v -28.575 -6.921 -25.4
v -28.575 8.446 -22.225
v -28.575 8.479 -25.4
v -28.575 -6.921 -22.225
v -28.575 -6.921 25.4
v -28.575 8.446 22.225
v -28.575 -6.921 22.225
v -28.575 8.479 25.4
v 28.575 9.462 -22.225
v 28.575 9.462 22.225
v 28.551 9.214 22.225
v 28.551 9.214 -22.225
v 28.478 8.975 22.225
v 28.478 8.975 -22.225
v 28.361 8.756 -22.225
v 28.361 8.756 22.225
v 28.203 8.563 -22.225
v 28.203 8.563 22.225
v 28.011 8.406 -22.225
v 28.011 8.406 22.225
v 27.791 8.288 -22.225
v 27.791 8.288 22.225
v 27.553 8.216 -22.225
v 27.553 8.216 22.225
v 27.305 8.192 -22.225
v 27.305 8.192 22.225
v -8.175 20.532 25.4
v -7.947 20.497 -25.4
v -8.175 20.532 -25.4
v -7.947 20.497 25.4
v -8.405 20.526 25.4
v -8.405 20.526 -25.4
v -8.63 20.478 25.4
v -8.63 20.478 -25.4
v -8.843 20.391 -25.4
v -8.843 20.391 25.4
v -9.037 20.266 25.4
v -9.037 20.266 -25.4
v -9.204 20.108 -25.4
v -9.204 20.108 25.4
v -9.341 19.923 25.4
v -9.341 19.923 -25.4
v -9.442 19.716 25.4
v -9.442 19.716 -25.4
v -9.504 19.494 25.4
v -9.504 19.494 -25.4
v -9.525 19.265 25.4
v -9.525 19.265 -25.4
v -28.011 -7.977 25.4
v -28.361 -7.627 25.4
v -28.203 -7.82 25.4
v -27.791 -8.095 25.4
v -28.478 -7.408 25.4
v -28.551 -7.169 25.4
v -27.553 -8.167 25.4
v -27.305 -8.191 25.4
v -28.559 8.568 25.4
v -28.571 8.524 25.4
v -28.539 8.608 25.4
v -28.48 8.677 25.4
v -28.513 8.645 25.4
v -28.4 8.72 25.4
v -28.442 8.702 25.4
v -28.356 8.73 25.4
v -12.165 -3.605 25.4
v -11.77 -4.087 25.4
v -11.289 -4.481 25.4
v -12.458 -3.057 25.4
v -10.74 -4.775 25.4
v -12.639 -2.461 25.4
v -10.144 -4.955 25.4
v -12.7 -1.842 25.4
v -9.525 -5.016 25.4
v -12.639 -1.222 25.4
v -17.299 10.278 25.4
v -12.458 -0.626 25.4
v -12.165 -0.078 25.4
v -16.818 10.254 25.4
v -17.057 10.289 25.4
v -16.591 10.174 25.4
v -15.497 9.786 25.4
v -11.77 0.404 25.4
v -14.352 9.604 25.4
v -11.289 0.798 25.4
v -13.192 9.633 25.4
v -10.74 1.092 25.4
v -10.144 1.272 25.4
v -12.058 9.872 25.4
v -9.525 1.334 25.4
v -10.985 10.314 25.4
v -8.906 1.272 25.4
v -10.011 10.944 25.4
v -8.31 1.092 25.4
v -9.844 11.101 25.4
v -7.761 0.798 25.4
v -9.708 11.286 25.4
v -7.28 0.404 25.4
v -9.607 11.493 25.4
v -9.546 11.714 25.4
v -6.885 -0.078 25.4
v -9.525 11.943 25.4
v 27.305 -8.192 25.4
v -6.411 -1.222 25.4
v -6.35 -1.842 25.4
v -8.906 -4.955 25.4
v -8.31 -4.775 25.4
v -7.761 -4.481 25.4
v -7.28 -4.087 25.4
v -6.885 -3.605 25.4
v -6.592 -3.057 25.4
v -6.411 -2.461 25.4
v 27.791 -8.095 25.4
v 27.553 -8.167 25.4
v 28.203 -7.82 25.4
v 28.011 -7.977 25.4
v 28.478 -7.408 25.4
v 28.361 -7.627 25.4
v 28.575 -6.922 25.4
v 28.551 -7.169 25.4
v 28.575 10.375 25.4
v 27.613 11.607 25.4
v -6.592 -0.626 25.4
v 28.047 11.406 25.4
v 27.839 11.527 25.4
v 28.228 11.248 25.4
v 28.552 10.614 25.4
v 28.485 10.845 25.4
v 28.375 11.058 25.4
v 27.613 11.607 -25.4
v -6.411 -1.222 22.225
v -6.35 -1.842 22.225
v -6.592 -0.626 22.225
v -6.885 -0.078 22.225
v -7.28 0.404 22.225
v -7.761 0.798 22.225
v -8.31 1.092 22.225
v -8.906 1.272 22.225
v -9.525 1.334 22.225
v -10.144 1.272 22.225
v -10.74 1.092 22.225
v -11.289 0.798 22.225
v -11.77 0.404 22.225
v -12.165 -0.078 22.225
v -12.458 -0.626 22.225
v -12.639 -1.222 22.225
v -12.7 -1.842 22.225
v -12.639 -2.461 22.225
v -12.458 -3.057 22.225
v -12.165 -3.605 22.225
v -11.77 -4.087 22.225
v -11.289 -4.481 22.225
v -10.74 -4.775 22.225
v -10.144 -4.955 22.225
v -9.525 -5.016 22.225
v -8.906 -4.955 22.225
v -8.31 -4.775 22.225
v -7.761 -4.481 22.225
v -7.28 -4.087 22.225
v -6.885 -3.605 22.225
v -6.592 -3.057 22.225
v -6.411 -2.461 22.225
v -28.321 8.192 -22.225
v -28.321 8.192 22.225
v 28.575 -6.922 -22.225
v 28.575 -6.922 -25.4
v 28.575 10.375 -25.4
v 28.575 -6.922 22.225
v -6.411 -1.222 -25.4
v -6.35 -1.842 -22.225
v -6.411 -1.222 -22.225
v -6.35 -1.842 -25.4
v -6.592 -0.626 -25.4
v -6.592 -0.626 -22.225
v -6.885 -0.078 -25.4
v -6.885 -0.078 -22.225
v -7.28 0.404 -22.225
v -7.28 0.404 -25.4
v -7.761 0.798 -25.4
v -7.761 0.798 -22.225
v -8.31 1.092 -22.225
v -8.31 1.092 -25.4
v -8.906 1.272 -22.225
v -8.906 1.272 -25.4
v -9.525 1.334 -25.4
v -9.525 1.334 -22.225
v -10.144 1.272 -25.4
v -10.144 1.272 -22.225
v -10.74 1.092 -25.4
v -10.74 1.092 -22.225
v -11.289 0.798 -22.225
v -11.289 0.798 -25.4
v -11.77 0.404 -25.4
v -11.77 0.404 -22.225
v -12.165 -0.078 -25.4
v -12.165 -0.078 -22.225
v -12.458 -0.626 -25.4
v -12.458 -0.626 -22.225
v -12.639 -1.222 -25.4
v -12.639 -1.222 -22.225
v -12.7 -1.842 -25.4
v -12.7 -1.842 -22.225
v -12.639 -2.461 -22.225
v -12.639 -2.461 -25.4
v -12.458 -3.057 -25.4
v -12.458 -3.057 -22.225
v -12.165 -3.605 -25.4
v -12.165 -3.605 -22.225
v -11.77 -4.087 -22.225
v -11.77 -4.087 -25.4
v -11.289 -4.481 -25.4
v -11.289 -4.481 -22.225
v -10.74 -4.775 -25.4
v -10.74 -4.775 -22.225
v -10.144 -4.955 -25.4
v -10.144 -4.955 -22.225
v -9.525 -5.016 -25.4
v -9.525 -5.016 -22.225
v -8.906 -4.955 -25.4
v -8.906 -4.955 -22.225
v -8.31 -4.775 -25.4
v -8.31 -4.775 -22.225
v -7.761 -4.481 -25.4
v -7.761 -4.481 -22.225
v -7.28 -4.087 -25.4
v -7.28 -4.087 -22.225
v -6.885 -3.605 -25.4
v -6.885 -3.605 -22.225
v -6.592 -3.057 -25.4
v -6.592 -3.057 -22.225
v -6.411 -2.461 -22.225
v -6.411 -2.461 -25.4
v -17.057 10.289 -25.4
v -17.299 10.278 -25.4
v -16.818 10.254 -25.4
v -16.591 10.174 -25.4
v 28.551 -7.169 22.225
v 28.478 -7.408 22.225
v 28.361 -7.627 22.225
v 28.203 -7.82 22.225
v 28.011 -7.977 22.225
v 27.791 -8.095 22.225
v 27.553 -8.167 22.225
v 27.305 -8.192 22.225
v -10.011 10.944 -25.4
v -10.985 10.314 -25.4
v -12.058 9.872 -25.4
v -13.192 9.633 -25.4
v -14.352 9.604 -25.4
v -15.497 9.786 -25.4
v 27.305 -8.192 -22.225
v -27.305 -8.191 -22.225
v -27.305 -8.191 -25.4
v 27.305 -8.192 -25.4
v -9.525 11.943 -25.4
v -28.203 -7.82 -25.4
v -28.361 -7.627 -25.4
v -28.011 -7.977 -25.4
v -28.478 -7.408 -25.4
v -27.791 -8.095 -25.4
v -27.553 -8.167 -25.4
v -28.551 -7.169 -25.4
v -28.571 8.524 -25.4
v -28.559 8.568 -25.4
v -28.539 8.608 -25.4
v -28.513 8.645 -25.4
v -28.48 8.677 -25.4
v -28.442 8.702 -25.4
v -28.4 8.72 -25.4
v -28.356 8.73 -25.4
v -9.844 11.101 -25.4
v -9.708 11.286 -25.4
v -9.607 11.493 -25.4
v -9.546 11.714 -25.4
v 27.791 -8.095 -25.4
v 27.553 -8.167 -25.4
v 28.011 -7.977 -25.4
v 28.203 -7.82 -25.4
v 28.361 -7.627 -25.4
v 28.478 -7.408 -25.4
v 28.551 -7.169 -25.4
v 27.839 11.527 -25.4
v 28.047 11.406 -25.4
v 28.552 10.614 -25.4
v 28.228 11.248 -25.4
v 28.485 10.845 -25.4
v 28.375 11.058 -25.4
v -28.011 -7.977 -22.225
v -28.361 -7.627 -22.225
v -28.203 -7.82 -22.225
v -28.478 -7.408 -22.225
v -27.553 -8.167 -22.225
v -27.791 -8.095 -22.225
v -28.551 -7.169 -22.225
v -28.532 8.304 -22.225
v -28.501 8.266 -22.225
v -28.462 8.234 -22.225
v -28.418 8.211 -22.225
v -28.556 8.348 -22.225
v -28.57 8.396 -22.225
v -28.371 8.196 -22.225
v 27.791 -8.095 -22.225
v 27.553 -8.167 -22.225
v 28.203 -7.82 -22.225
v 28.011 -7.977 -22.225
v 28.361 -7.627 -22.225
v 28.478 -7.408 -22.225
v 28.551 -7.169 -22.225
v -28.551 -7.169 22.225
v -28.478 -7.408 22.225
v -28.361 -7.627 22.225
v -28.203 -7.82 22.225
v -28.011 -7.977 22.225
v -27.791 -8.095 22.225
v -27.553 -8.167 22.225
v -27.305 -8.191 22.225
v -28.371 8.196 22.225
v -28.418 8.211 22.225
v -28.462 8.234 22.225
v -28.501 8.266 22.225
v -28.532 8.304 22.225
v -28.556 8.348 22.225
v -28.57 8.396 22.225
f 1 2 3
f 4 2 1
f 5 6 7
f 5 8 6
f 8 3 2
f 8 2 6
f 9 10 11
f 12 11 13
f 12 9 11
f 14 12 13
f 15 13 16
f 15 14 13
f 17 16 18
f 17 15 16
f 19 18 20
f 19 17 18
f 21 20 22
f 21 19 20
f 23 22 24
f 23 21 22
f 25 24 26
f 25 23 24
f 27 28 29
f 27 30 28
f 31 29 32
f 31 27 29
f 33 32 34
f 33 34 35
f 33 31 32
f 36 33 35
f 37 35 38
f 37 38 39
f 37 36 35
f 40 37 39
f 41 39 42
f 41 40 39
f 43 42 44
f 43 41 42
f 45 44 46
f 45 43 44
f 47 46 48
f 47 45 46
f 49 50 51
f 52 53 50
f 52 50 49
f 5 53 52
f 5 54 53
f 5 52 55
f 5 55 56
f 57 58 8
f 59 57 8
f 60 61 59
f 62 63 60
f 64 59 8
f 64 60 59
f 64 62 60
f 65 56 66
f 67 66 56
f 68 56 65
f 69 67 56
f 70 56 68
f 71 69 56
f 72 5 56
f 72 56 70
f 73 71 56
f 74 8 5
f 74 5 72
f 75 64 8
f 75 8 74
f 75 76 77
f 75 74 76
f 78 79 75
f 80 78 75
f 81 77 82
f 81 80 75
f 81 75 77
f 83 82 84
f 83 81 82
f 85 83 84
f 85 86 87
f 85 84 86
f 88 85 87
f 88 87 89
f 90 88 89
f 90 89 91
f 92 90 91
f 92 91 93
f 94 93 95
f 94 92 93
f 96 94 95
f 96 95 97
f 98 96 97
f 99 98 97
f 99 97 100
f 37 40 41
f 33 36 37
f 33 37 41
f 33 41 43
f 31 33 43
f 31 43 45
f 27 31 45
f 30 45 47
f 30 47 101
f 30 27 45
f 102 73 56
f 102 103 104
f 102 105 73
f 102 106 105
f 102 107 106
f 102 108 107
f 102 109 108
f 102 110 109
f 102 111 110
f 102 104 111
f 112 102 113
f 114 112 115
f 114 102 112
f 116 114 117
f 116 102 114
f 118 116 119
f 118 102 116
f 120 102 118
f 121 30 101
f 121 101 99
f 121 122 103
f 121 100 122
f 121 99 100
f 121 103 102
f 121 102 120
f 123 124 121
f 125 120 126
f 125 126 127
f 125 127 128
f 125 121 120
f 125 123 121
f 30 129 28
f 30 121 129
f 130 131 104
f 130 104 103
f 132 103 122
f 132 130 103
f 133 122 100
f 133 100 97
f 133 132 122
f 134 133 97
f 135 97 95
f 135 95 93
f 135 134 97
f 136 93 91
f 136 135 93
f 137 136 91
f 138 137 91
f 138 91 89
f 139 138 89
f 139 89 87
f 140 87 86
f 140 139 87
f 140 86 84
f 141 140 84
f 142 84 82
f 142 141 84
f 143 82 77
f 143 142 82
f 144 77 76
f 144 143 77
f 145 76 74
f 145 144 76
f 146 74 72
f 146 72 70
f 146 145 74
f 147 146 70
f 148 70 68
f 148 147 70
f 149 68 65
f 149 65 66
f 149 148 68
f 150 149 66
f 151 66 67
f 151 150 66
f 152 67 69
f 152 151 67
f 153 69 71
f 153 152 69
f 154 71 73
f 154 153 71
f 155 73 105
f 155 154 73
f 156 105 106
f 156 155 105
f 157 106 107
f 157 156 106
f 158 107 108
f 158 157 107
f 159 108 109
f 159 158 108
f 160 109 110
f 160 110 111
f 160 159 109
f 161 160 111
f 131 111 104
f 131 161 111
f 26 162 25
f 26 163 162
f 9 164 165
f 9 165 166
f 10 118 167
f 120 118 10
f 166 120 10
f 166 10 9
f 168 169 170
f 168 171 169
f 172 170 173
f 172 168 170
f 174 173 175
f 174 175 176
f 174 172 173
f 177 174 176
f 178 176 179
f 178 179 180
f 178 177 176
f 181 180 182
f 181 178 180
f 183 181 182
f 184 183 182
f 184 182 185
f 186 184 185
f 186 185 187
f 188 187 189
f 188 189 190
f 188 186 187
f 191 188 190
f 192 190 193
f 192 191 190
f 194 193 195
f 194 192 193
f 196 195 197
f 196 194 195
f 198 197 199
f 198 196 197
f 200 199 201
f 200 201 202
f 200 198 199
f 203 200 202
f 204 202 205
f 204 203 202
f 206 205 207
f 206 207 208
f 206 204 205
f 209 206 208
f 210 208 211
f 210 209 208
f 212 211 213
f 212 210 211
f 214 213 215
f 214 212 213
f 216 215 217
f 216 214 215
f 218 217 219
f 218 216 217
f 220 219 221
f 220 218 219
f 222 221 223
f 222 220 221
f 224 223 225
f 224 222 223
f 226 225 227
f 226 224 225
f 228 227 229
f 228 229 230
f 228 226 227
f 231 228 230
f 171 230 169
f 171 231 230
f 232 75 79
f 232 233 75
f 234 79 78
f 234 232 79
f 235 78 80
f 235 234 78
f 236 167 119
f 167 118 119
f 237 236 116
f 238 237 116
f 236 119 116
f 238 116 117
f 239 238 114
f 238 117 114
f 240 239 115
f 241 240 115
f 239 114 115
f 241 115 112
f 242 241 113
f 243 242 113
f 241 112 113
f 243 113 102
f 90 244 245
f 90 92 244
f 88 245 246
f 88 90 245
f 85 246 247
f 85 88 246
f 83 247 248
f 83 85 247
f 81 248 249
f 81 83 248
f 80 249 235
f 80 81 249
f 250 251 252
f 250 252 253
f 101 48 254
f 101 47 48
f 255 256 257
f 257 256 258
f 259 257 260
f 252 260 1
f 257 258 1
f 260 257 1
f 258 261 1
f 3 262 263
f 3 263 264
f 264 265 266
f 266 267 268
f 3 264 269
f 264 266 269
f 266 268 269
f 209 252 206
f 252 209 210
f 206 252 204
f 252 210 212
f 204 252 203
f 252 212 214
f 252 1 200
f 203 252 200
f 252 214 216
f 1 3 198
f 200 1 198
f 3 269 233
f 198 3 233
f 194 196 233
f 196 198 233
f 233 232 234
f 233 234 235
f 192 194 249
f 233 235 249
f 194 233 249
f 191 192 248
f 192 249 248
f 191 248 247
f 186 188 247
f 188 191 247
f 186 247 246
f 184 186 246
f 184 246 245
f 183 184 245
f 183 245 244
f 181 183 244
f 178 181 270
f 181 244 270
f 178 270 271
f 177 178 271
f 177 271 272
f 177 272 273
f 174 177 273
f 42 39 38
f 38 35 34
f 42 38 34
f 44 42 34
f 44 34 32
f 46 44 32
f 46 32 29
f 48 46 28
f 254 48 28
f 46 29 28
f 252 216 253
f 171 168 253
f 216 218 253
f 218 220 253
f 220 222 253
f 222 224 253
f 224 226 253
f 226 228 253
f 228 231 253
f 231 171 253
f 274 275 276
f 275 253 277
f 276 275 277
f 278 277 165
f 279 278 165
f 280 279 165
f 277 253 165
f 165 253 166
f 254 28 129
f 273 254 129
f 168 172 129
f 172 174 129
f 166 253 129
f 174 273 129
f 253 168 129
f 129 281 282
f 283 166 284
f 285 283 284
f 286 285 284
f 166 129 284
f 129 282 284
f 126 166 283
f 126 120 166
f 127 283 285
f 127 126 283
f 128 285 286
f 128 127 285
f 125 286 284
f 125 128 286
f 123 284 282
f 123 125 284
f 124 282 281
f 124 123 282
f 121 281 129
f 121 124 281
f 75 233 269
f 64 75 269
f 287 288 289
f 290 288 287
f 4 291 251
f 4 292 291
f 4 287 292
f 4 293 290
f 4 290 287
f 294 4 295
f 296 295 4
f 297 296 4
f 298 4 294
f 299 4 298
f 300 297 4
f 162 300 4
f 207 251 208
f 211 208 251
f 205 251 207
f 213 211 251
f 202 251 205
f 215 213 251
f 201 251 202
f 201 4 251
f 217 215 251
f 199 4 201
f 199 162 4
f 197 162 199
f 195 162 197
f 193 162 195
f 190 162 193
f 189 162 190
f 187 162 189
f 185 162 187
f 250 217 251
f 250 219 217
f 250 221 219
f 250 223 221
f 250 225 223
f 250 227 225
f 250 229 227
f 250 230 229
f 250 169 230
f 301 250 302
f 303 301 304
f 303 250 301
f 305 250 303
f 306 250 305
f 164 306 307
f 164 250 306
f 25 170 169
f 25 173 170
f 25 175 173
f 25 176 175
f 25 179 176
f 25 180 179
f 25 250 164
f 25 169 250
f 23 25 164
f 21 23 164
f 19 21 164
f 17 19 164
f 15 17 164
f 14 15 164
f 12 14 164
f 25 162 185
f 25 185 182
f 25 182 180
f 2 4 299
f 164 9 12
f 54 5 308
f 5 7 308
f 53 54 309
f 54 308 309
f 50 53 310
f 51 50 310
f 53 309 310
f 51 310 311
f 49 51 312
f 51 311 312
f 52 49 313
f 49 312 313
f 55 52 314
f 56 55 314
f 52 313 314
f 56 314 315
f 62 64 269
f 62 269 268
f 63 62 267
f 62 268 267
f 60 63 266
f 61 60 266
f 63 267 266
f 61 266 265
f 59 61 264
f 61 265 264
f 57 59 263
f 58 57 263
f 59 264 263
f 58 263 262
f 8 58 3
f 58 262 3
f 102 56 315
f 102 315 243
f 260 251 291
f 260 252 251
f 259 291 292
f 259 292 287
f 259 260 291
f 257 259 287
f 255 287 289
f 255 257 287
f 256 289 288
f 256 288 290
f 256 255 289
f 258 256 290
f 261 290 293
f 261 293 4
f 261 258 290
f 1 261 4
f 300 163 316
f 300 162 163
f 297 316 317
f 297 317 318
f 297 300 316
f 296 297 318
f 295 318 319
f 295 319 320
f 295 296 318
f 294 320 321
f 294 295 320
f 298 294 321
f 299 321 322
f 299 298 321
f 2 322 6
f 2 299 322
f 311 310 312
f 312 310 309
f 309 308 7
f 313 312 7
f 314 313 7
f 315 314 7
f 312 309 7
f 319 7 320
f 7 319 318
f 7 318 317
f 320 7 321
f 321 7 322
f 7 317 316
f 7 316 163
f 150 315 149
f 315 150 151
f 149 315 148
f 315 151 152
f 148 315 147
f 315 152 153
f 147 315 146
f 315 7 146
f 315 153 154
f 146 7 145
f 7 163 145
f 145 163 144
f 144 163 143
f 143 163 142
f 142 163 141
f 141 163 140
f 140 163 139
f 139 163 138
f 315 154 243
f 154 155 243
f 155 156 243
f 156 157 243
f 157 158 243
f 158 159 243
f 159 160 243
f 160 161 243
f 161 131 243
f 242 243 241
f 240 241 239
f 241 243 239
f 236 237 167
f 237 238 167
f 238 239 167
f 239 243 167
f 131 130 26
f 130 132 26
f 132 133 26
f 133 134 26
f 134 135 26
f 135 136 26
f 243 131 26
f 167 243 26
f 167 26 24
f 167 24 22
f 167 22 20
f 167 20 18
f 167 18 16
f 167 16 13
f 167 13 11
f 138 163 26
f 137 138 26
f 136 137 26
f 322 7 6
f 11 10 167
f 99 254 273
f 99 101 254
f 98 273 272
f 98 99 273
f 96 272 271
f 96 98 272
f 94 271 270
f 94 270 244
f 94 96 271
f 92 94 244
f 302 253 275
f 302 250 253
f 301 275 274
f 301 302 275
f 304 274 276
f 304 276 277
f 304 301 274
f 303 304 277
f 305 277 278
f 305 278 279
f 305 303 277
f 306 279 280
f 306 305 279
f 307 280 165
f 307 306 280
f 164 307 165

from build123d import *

# Parameters (mm, degrees)
SKETCH1_R           = 3.175
BOSS_EXTRUDE1_DEPTH = 25.4
SKETCH1_4_W         = 57.15
SKETCH1_4_H         = 16.383
SKETCH1_4_R         = 3.175
CUT_EXTRUDE1_DEPTH  = 22.225
FILLET2_R           = 1.27
FILLET3_R           = 0.254


with BuildPart() as part:
    # Sketch1 → Boss-Extrude1 (new, symmetric)
    with BuildSketch(Plane.XY):
        with BuildLine():
            Line((-9.525, 20.8915), (-9.525, 11.3665))
            ThreePointArc((-9.525, 11.3665), (-13.050132349, 9.650975764), (-16.910848847, 10.332481161))
            Line((-16.910848847, 10.332481161), (-28.575, 8.6995))
            Line((-28.575, 8.6995), (-28.575, -8.1915))
            Line((-28.575, -8.1915), (28.575, -8.1915))
            Line((28.575, -8.1915), (28.575, 11.3665))
            Line((28.575, 11.3665), (-9.525, 20.8915))
        make_face()
        with Locations((-9.525, -1.8415)):
            Circle(SKETCH1_R, mode=Mode.SUBTRACT)
    extrude(amount=BOSS_EXTRUDE1_DEPTH, both=True)

    # Sketch1<4> → Cut-Extrude1 (cut, symmetric)
    with BuildSketch(Plane.XY):
        Rectangle(SKETCH1_4_W, SKETCH1_4_H)
        with Locations((-9.525, -1.8415)):
            Circle(SKETCH1_4_R, mode=Mode.SUBTRACT)
    extrude(amount=CUT_EXTRUDE1_DEPTH, both=True, mode=Mode.SUBTRACT)

    # Fillet2
    fillet2_edges = [part.edges().sort_by_distance(p)[0] for p in [
        (28.575, 8.1915, 0),
        (28.575, 11.3665, 0),
        (-9.525, 20.8915, 0),
        (-28.575, -8.1915, 23.8125),
        (-28.575, -8.1915, -23.8125),
        (28.575, -8.1915, -23.8125),
        (28.575, -8.1915, 23.8125),
        (-16.910848847, 10.332481161, 0),
        (-9.525, 11.3665, 0),
    ]]
    fillet(fillet2_edges, radius=FILLET2_R)

    # Fillet3
    fillet3_edges = [part.edges().sort_by_distance(p)[0] for p in [
        (-28.575, 8.1915, 0),
        (-28.575, 8.6995, 0),
    ]]
    fillet(fillet3_edges, radius=FILLET3_R)


solid = part.part
